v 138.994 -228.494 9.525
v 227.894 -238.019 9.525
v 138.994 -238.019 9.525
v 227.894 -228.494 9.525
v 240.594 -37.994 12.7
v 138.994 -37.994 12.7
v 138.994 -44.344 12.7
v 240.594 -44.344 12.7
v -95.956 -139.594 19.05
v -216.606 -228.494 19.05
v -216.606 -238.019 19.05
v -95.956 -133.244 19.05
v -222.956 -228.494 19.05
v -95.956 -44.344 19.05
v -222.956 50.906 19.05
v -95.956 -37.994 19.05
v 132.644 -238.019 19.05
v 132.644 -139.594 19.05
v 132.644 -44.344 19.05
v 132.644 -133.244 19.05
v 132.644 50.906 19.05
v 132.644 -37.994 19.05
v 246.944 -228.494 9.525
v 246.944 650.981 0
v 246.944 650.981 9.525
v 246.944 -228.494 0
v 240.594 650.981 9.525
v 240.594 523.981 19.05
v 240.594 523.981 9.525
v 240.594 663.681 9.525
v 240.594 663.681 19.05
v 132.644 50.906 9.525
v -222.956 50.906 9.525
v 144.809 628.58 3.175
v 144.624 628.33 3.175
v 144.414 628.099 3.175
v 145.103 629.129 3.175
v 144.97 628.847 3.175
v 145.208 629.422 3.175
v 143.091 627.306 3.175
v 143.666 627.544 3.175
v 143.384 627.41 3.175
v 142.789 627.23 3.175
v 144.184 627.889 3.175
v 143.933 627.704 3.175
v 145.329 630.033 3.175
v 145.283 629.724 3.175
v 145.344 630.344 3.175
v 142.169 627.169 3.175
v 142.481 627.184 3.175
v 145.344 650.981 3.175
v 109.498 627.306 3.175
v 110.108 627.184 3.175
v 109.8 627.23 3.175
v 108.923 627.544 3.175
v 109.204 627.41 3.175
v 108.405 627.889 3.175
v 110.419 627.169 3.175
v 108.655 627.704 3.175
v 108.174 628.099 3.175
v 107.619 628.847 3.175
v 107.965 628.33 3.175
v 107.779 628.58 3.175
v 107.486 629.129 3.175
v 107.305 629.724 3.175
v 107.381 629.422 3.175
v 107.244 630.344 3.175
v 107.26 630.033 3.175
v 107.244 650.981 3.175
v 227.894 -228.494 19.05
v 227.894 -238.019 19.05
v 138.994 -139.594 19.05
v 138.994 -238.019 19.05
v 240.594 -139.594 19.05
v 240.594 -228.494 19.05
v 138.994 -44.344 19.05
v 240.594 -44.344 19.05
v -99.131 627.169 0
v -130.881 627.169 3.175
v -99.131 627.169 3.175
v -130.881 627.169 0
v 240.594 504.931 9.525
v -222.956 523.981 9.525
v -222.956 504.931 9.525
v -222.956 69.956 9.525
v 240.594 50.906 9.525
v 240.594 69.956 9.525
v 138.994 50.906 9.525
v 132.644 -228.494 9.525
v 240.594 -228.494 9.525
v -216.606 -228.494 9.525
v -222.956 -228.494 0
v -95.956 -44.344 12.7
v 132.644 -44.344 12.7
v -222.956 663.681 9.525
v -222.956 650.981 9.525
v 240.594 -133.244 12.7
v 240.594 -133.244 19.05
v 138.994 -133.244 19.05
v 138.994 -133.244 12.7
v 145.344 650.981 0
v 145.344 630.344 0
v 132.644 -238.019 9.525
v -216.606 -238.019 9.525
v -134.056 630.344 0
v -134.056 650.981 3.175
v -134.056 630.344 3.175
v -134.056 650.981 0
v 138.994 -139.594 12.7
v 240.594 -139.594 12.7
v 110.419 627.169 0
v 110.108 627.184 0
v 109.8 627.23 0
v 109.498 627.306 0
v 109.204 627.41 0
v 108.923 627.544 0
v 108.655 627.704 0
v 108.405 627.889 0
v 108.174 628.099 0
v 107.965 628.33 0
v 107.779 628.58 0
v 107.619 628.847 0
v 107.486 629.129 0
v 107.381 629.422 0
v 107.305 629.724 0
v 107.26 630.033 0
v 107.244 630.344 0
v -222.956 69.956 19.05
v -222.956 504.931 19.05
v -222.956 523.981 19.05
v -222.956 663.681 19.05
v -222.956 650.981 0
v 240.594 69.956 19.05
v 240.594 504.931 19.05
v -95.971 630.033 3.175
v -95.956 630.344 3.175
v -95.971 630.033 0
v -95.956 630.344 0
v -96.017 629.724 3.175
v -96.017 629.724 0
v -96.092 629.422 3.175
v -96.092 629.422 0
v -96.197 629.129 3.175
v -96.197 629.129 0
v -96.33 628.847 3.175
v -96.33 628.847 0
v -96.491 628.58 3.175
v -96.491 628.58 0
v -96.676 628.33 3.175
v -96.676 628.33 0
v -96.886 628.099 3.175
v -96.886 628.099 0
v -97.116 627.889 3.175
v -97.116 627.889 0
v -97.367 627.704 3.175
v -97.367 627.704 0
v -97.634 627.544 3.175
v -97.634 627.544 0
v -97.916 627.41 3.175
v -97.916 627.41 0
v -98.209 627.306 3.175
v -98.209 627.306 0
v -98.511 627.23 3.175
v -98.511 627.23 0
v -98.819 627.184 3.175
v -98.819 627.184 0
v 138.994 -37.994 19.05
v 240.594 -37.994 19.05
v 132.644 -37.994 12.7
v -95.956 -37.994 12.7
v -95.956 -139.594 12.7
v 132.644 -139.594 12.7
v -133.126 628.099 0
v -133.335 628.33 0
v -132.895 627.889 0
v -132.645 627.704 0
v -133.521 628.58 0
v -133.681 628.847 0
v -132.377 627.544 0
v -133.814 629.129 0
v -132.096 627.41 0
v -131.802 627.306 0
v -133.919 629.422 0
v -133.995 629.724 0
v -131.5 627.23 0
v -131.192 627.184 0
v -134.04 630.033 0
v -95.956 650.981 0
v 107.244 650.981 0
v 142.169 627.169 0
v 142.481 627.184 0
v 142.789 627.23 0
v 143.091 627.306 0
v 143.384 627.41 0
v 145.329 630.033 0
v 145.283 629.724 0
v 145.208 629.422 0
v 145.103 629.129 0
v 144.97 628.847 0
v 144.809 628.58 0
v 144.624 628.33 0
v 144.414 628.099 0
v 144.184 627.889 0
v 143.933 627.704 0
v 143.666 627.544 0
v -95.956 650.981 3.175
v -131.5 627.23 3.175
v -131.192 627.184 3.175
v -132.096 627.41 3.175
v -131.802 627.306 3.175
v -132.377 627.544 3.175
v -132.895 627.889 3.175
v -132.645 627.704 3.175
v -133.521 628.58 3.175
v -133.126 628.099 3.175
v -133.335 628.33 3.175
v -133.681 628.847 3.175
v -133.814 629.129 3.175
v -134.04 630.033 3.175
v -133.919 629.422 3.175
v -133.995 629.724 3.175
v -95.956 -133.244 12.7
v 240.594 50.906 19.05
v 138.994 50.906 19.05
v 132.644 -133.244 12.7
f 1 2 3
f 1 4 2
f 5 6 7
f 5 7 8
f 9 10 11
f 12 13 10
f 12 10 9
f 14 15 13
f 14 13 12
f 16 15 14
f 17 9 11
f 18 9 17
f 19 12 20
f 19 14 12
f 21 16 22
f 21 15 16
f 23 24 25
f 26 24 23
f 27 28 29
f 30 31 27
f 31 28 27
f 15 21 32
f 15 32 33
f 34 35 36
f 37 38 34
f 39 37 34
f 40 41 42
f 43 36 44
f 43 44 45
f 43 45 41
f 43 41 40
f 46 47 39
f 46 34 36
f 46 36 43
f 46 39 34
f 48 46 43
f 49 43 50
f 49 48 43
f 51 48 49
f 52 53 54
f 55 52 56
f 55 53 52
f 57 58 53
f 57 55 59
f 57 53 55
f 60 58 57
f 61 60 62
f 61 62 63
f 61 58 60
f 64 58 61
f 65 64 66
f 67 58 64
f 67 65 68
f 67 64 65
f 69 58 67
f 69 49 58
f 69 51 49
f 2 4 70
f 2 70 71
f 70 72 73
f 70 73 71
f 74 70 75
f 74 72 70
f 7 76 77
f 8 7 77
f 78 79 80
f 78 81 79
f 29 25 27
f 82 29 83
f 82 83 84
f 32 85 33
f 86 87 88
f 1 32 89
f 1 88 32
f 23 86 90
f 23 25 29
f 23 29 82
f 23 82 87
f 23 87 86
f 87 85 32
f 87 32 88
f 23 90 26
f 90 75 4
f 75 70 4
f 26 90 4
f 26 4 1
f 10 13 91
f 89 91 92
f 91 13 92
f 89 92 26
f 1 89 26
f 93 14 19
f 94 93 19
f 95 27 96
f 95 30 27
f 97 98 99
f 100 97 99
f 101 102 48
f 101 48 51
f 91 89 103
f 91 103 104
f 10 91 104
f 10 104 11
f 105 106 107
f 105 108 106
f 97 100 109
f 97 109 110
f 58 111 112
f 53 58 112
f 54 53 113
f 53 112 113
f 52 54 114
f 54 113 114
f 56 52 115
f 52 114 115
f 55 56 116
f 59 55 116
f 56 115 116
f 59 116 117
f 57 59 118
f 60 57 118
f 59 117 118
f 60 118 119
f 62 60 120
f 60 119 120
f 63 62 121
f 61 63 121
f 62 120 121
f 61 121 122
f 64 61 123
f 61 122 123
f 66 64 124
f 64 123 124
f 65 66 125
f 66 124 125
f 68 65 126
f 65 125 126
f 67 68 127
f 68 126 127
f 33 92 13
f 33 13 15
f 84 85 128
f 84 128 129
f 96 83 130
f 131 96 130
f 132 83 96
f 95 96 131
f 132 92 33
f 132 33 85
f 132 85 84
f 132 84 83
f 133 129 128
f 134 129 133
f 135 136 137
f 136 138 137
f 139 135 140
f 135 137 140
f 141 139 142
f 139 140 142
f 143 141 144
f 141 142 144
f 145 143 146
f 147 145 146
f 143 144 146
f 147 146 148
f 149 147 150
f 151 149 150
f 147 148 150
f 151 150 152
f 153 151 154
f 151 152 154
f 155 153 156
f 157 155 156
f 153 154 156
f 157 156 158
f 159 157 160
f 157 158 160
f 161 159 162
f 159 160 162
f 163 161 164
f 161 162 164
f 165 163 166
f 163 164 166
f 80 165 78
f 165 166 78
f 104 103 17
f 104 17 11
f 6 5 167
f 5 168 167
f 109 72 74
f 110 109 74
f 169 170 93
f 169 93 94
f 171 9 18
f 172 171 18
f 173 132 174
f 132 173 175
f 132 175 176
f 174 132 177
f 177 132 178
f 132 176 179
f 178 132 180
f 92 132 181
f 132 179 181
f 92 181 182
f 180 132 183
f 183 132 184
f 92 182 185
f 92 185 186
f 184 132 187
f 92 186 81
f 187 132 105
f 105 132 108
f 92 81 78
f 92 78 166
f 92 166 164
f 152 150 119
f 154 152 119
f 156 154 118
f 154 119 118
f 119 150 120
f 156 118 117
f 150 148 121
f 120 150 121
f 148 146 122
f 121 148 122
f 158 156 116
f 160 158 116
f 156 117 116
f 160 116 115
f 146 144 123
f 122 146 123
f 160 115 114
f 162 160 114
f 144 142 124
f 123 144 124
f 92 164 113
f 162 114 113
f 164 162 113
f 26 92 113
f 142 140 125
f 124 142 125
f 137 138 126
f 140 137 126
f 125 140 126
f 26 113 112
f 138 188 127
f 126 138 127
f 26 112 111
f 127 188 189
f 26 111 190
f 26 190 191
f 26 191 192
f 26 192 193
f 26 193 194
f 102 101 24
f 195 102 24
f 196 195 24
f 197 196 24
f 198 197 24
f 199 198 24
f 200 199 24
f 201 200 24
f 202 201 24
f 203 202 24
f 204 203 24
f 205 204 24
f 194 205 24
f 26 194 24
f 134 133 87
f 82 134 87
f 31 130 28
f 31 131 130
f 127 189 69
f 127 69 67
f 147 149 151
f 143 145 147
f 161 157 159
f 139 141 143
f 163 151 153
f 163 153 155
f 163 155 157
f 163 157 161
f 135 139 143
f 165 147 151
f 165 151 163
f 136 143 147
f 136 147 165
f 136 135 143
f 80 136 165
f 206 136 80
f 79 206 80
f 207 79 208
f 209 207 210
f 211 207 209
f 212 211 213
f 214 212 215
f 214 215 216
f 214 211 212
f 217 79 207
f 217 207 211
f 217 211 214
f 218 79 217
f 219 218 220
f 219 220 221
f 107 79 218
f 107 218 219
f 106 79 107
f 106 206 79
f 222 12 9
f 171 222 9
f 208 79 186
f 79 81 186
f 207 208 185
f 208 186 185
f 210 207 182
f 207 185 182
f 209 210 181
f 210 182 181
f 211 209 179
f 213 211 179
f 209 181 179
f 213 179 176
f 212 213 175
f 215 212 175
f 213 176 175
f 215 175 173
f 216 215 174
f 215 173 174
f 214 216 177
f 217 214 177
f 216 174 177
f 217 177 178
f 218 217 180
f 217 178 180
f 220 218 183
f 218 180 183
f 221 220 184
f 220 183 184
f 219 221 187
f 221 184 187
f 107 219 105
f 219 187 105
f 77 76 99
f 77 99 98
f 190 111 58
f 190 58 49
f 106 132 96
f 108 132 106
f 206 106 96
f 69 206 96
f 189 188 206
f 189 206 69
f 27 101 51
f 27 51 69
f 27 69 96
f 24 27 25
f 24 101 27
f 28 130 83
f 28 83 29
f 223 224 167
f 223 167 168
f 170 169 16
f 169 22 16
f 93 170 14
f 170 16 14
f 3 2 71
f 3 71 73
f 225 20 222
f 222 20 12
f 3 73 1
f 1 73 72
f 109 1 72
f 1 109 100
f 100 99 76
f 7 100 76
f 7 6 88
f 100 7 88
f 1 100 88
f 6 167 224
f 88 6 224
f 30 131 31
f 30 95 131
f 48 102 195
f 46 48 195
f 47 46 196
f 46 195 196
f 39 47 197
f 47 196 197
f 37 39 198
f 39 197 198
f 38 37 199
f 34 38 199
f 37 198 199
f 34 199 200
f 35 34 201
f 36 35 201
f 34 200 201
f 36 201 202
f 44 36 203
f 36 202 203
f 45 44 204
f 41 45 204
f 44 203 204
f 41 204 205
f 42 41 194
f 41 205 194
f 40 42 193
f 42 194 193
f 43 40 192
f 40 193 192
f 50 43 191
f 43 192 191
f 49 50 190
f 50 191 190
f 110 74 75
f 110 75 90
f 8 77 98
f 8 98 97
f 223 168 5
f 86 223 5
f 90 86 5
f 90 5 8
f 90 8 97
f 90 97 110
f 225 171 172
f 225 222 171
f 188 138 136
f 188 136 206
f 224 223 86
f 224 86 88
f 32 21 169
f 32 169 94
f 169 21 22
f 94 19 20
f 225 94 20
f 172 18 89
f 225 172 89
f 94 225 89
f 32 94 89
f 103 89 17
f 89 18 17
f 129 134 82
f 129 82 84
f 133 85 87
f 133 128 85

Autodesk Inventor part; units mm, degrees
ref_plane "YZ Plane" through (0, 0, 0) normal (1, 0, 0) x (0, 1, 0)
ref_plane "XZ Plane" through (0, 0, 0) normal (0, 1, 0) x (-1, 0, 0)
ref_plane "XY Plane" through (0, 0, 0) normal (0, 0, 1) x (1, 0, 0)
sketch "Sketch1" plane through (0, 0, 0) normal (0, 0, 1) x (1, 0, 0)
  line L0 (-222.9556, 663.6813) -> (246.9444, 663.6813)
  line L1 (246.9444, 663.6813) -> (246.9444, -238.0187)
  line L2 (246.9444, -238.0187) -> (-222.9556, -238.0187)
  line L3 (-222.9556, -238.0187) -> (-222.9556, 663.6813)
  point P0 (0, 0)
  dimension "d0" = 469.9
  dimension "d1" = 901.7
extrude "Board" add sketch "Sketch1" along normal blind 19.05
sketch "Sketch2" plane through (0, 0, 19.05) normal (0, 0, 1) x (1, 0, 0)
  line L0 (-222.9556, 663.6813) -> (-222.9556, -238.0187) projected
  line L1 (246.9444, -238.0187) -> (246.9444, 663.6813) projected
  line L2 (-222.9556, 69.9563) -> (246.9444, 69.9563)
  line L3 (246.9444, 69.9563) -> (246.9444, 50.9063)
  line L4 (246.9444, 50.9063) -> (-222.9556, 50.9063)
  line L5 (-222.9556, 50.9063) -> (-222.9556, 69.9563)
  line L6 (246.9444, 663.6813) -> (-222.9556, 663.6813) projected
  line L7 (-222.9556, -238.0187) -> (246.9444, -238.0187) projected
  point P0 (0, 0)
  dimension "d4" = 19.05
  dimension "d19" = 288.925
extrude "Inner Lower Shelf Dado" cut sketch "Sketch2" against normal blind 9.525 contours L2 L1 L4 L0
sketch "Sketch4" plane through (0, 0, 19.05) normal (0, 0, 1) x (1, 0, 0)
  line L0 (-222.9556, 523.9813) -> (246.9444, 523.9813)
  line L1 (246.9444, 523.9813) -> (246.9444, 504.9313)
  line L2 (246.9444, 504.9313) -> (-222.9556, 504.9313)
  line L3 (-222.9556, 504.9313) -> (-222.9556, 523.9813)
  line L4 (246.9444, 663.6813) -> (-222.9556, 663.6813) projected
  line L5 (246.9444, -238.0187) -> (246.9444, 663.6813) projected
  line L6 (-222.9556, 663.6813) -> (-222.9556, -238.0187) projected
  point P0 (0, 0)
  point P1 (246.9444, 69.9563)
  point P2 (-222.9556, 69.9563)
  dimension "d20" = 19.05
  dimension "d21" = 139.7
extrude "Inner Upper Shelf Dado" cut sketch "Sketch4" against normal blind 9.525 contours L0 L1 L2 L3
sketch "Sketch7" plane through (0, 0, 0) normal (0, 0, -1) x (-1, 0, 0)
  line L0 (222.9556, 663.6813) -> (-246.9444, 663.6813) projected
  line L1 (-246.9444, 663.6813) -> (222.9556, 663.6813)
  line L2 (222.9556, 663.6813) -> (222.9556, 650.9813)
  line L3 (222.9556, 650.9813) -> (-246.9444, 650.9813)
  line L4 (-246.9444, 650.9813) -> (-246.9444, 663.6813)
  line L5 (222.9556, -238.0187) -> (222.9556, 663.6813) projected
  line L6 (-246.9444, -238.0187) -> (222.9556, -238.0187)
  line L7 (222.9556, -238.0187) -> (222.9556, -228.4937)
  line L8 (222.9556, -228.4937) -> (-246.9444, -228.4937)
  line L9 (-246.9444, -228.4937) -> (-246.9444, -238.0187)
  line L10 (-246.9444, -238.0187) -> (222.9556, -238.0187) projected
  point P0 (0, 0)
  dimension "d32" = 12.7
  dimension "d40" = 9.525
extrude "Top and Bottom Exterior Dados" cut sketch "Sketch7" against normal blind 9.525
sketch "Sketch9" plane through (246.9444, -238.0187, 19.05) normal (1, 0, 0) x (0, 0, -1)
  line L0 (0, 901.7) -> (9.525, 901.7)
  line L1 (9.525, 901.7) -> (9.525, 0)
  line L2 (9.525, 0) -> (0, 0)
  line L3 (0, 0) -> (0, 901.7)
  line L4 (9.525, 901.7) -> (0, 901.7) projected
  line L5 (9.525, 0) -> (0, 0) projected
  line L6 (0, 0) -> (0, 742.95) projected
  point P0 (19.05, 238.0187)
  point P1 (0, 307.975)
  dimension "d41" = 9.525
extrude "Back Panel Notch" cut sketch "Sketch9" against normal blind 6.35
sketch "Sketch10" plane through (0, 0, 0) normal (0, 0, -1) x (-1, 0, 0)
  line L0 (-145.3444, 650.9813) -> (-107.2444, 650.9813)
  line L1 (-107.2444, 650.9813) -> (-107.2444, 630.3438)
  line L2 (-110.4194, 627.1688) -> (-142.1694, 627.1688)
  line L3 (-145.3444, 630.3438) -> (-145.3444, 650.9813)
  line L4 (-246.9444, 650.9813) -> (-246.9444, -228.4937) projected
  line L5 (222.9556, 650.9813) -> (-246.9444, 650.9813) projected
  line L6 (95.9556, 650.9813) -> (134.0556, 650.9813)
  line L7 (134.0556, 650.9813) -> (134.0556, 630.3438)
  line L8 (130.8806, 627.1688) -> (99.1306, 627.1688)
  line L9 (95.9556, 630.3438) -> (95.9556, 650.9813)
  arc A0 (-145.3444, 630.3438) -> (-142.1694, 627.1688) centre (-142.1694, 630.3438) ccw
  arc A1 (-110.4194, 627.1688) -> (-107.2444, 630.3438) centre (-110.4194, 630.3438) ccw
  arc A2 (95.9556, 630.3438) -> (99.1306, 627.1688) centre (99.1306, 630.3438) ccw
  arc A3 (130.8806, 627.1688) -> (134.0556, 630.3438) centre (130.8806, 630.3438) ccw
  point P0 (0, 0)
  point P1 (-107.2444, 627.1688)
  point P2 (-145.3444, 627.1688)
  point P3 (134.0556, 627.1688)
  point P4 (95.9556, 627.1688)
  dimension "d44" = 38.1
  dimension "d45" = 23.8125
  dimension "d46" = 101.6
  dimension "d47" = 38.1
  dimension "d48" = 23.8125
  dimension "d49" = 203.2
  dimension "d50" = 3.175
extrude "Top Hinge Notches" cut sketch "Sketch10" against normal blind 3.175
sketch "Sketch12" plane through (-222.9556, -238.0187, 19.05) normal (-1, 0, 0) x (0, 0, 1)
  line L0 (-9.525, 9.525) -> (-9.525, 0) projected
  line L1 (0, 901.7) -> (0, 0) projected
  line L2 (-9.525, 0) -> (0, 0)
  line L3 (0, 0) -> (0, 9.525)
  line L4 (0, 9.525) -> (-9.525, 9.525)
  line L5 (-9.525, 9.525) -> (-9.525, 0)
  line L6 (-19.05, 9.525) -> (-9.525, 9.525) projected
  point P0 (-19.05, 238.0187)
  point P1 (0, 288.925)
extrude "Front notch to cover dado" cut sketch "Sketch12" against normal blind 6.35
sketch "Sketch3" plane through (0, 0, 19.05) normal (0, 0, 1) x (1, 0, 0)
  line L0 (240.5944, -133.2437) -> (-95.9556, -133.2437)
  line L1 (-95.9556, -133.2437) -> (-95.9556, -139.5937)
  line L2 (-95.9556, -139.5937) -> (240.5944, -139.5937)
  line L3 (240.5944, -139.5937) -> (240.5944, -133.2437)
  line L4 (-222.9556, -238.0187) -> (246.9444, -238.0187) projected
  line L5 (259.6444, -37.9937) -> (-95.9556, -37.9937)
  line L6 (-95.9556, -37.9937) -> (-95.9556, -44.3437)
  line L7 (-95.9556, -44.3437) -> (259.6444, -44.3437)
  line L8 (259.6444, -44.3437) -> (259.6444, -37.9937)
  line L9 (-222.9556, 663.6813) -> (-222.9556, -238.0187) projected
  line L10 (246.9444, 50.9063) -> (-222.9556, 50.9063) projected
  line L11 (246.9444, -228.4937) -> (240.5944, -228.4937) projected
  point P0 (0, 0)
  dimension "d9" = 6.35
  dimension "d14" = 6.35
  dimension "d17" = 88.9
  dimension "d26" = 127
  dimension "d67" = 88.9
extrude "Inner Wine Rack Dados" cut sketch "Sketch3" against normal blind 6.35
sketch "Sketch8" plane through (0, 0, 19.05) normal (0, 0, 1) x (1, 0, 0)
  line L0 (246.9444, 50.9063) -> (-222.9556, 50.9063) projected
  line L1 (132.6444, -238.0187) -> (138.9944, -238.0187)
  line L2 (138.9944, -238.0187) -> (138.9944, 50.9063)
  line L3 (138.9944, 50.9063) -> (132.6444, 50.9063)
  line L4 (132.6444, 50.9063) -> (132.6444, -238.0187)
  line L5 (-95.9556, -139.5937) -> (-95.9556, -133.2437) projected
  line L6 (-222.9556, -238.0187) -> (246.9444, -238.0187) projected
  point P0 (0, 0)
  dimension "d35" = 6.35
  dimension "d36" = 228.6
extrude "Vertical Wine Bottle False Back" cut sketch "Sketch8" against normal blind 9.525
sketch "Sketch13" plane through (0, 0, 9.525) normal (0, 0, -1) x (-1, 0, 0)
  line L0 (-246.9444, 650.9813) -> (-246.9444, -228.4937) projected
  line L1 (216.6056, -238.0187) -> (-240.5944, -238.0187) projected
  line L2 (-246.9444, -228.4937) -> (-227.8944, -228.4937)
  line L3 (-227.8944, -228.4937) -> (-227.8944, -238.0187)
  line L4 (-227.8944, -238.0187) -> (-246.9444, -238.0187)
  line L5 (-246.9444, -238.0187) -> (-246.9444, -228.4937)
  point P0 (0, 0)
  point P1 (-138.9944, -238.0187)
  dimension "d64" = 19.05
extrude "Rear notch for bottom runner" cut sketch "Sketch13" against normal blind 19.05
equation "\"d6\" = 0.5 * d2"
equation "\"d22\" = 0.5 * d2"
equation "\"d47\" = d44"
equation "\"d48\" = d45"
equation "\"d49\" = 2 * d46"
equation "\"d37\" = 0.5 * d2"
equation "\"d2\" = 19.05"
properties part number "Left Side"
